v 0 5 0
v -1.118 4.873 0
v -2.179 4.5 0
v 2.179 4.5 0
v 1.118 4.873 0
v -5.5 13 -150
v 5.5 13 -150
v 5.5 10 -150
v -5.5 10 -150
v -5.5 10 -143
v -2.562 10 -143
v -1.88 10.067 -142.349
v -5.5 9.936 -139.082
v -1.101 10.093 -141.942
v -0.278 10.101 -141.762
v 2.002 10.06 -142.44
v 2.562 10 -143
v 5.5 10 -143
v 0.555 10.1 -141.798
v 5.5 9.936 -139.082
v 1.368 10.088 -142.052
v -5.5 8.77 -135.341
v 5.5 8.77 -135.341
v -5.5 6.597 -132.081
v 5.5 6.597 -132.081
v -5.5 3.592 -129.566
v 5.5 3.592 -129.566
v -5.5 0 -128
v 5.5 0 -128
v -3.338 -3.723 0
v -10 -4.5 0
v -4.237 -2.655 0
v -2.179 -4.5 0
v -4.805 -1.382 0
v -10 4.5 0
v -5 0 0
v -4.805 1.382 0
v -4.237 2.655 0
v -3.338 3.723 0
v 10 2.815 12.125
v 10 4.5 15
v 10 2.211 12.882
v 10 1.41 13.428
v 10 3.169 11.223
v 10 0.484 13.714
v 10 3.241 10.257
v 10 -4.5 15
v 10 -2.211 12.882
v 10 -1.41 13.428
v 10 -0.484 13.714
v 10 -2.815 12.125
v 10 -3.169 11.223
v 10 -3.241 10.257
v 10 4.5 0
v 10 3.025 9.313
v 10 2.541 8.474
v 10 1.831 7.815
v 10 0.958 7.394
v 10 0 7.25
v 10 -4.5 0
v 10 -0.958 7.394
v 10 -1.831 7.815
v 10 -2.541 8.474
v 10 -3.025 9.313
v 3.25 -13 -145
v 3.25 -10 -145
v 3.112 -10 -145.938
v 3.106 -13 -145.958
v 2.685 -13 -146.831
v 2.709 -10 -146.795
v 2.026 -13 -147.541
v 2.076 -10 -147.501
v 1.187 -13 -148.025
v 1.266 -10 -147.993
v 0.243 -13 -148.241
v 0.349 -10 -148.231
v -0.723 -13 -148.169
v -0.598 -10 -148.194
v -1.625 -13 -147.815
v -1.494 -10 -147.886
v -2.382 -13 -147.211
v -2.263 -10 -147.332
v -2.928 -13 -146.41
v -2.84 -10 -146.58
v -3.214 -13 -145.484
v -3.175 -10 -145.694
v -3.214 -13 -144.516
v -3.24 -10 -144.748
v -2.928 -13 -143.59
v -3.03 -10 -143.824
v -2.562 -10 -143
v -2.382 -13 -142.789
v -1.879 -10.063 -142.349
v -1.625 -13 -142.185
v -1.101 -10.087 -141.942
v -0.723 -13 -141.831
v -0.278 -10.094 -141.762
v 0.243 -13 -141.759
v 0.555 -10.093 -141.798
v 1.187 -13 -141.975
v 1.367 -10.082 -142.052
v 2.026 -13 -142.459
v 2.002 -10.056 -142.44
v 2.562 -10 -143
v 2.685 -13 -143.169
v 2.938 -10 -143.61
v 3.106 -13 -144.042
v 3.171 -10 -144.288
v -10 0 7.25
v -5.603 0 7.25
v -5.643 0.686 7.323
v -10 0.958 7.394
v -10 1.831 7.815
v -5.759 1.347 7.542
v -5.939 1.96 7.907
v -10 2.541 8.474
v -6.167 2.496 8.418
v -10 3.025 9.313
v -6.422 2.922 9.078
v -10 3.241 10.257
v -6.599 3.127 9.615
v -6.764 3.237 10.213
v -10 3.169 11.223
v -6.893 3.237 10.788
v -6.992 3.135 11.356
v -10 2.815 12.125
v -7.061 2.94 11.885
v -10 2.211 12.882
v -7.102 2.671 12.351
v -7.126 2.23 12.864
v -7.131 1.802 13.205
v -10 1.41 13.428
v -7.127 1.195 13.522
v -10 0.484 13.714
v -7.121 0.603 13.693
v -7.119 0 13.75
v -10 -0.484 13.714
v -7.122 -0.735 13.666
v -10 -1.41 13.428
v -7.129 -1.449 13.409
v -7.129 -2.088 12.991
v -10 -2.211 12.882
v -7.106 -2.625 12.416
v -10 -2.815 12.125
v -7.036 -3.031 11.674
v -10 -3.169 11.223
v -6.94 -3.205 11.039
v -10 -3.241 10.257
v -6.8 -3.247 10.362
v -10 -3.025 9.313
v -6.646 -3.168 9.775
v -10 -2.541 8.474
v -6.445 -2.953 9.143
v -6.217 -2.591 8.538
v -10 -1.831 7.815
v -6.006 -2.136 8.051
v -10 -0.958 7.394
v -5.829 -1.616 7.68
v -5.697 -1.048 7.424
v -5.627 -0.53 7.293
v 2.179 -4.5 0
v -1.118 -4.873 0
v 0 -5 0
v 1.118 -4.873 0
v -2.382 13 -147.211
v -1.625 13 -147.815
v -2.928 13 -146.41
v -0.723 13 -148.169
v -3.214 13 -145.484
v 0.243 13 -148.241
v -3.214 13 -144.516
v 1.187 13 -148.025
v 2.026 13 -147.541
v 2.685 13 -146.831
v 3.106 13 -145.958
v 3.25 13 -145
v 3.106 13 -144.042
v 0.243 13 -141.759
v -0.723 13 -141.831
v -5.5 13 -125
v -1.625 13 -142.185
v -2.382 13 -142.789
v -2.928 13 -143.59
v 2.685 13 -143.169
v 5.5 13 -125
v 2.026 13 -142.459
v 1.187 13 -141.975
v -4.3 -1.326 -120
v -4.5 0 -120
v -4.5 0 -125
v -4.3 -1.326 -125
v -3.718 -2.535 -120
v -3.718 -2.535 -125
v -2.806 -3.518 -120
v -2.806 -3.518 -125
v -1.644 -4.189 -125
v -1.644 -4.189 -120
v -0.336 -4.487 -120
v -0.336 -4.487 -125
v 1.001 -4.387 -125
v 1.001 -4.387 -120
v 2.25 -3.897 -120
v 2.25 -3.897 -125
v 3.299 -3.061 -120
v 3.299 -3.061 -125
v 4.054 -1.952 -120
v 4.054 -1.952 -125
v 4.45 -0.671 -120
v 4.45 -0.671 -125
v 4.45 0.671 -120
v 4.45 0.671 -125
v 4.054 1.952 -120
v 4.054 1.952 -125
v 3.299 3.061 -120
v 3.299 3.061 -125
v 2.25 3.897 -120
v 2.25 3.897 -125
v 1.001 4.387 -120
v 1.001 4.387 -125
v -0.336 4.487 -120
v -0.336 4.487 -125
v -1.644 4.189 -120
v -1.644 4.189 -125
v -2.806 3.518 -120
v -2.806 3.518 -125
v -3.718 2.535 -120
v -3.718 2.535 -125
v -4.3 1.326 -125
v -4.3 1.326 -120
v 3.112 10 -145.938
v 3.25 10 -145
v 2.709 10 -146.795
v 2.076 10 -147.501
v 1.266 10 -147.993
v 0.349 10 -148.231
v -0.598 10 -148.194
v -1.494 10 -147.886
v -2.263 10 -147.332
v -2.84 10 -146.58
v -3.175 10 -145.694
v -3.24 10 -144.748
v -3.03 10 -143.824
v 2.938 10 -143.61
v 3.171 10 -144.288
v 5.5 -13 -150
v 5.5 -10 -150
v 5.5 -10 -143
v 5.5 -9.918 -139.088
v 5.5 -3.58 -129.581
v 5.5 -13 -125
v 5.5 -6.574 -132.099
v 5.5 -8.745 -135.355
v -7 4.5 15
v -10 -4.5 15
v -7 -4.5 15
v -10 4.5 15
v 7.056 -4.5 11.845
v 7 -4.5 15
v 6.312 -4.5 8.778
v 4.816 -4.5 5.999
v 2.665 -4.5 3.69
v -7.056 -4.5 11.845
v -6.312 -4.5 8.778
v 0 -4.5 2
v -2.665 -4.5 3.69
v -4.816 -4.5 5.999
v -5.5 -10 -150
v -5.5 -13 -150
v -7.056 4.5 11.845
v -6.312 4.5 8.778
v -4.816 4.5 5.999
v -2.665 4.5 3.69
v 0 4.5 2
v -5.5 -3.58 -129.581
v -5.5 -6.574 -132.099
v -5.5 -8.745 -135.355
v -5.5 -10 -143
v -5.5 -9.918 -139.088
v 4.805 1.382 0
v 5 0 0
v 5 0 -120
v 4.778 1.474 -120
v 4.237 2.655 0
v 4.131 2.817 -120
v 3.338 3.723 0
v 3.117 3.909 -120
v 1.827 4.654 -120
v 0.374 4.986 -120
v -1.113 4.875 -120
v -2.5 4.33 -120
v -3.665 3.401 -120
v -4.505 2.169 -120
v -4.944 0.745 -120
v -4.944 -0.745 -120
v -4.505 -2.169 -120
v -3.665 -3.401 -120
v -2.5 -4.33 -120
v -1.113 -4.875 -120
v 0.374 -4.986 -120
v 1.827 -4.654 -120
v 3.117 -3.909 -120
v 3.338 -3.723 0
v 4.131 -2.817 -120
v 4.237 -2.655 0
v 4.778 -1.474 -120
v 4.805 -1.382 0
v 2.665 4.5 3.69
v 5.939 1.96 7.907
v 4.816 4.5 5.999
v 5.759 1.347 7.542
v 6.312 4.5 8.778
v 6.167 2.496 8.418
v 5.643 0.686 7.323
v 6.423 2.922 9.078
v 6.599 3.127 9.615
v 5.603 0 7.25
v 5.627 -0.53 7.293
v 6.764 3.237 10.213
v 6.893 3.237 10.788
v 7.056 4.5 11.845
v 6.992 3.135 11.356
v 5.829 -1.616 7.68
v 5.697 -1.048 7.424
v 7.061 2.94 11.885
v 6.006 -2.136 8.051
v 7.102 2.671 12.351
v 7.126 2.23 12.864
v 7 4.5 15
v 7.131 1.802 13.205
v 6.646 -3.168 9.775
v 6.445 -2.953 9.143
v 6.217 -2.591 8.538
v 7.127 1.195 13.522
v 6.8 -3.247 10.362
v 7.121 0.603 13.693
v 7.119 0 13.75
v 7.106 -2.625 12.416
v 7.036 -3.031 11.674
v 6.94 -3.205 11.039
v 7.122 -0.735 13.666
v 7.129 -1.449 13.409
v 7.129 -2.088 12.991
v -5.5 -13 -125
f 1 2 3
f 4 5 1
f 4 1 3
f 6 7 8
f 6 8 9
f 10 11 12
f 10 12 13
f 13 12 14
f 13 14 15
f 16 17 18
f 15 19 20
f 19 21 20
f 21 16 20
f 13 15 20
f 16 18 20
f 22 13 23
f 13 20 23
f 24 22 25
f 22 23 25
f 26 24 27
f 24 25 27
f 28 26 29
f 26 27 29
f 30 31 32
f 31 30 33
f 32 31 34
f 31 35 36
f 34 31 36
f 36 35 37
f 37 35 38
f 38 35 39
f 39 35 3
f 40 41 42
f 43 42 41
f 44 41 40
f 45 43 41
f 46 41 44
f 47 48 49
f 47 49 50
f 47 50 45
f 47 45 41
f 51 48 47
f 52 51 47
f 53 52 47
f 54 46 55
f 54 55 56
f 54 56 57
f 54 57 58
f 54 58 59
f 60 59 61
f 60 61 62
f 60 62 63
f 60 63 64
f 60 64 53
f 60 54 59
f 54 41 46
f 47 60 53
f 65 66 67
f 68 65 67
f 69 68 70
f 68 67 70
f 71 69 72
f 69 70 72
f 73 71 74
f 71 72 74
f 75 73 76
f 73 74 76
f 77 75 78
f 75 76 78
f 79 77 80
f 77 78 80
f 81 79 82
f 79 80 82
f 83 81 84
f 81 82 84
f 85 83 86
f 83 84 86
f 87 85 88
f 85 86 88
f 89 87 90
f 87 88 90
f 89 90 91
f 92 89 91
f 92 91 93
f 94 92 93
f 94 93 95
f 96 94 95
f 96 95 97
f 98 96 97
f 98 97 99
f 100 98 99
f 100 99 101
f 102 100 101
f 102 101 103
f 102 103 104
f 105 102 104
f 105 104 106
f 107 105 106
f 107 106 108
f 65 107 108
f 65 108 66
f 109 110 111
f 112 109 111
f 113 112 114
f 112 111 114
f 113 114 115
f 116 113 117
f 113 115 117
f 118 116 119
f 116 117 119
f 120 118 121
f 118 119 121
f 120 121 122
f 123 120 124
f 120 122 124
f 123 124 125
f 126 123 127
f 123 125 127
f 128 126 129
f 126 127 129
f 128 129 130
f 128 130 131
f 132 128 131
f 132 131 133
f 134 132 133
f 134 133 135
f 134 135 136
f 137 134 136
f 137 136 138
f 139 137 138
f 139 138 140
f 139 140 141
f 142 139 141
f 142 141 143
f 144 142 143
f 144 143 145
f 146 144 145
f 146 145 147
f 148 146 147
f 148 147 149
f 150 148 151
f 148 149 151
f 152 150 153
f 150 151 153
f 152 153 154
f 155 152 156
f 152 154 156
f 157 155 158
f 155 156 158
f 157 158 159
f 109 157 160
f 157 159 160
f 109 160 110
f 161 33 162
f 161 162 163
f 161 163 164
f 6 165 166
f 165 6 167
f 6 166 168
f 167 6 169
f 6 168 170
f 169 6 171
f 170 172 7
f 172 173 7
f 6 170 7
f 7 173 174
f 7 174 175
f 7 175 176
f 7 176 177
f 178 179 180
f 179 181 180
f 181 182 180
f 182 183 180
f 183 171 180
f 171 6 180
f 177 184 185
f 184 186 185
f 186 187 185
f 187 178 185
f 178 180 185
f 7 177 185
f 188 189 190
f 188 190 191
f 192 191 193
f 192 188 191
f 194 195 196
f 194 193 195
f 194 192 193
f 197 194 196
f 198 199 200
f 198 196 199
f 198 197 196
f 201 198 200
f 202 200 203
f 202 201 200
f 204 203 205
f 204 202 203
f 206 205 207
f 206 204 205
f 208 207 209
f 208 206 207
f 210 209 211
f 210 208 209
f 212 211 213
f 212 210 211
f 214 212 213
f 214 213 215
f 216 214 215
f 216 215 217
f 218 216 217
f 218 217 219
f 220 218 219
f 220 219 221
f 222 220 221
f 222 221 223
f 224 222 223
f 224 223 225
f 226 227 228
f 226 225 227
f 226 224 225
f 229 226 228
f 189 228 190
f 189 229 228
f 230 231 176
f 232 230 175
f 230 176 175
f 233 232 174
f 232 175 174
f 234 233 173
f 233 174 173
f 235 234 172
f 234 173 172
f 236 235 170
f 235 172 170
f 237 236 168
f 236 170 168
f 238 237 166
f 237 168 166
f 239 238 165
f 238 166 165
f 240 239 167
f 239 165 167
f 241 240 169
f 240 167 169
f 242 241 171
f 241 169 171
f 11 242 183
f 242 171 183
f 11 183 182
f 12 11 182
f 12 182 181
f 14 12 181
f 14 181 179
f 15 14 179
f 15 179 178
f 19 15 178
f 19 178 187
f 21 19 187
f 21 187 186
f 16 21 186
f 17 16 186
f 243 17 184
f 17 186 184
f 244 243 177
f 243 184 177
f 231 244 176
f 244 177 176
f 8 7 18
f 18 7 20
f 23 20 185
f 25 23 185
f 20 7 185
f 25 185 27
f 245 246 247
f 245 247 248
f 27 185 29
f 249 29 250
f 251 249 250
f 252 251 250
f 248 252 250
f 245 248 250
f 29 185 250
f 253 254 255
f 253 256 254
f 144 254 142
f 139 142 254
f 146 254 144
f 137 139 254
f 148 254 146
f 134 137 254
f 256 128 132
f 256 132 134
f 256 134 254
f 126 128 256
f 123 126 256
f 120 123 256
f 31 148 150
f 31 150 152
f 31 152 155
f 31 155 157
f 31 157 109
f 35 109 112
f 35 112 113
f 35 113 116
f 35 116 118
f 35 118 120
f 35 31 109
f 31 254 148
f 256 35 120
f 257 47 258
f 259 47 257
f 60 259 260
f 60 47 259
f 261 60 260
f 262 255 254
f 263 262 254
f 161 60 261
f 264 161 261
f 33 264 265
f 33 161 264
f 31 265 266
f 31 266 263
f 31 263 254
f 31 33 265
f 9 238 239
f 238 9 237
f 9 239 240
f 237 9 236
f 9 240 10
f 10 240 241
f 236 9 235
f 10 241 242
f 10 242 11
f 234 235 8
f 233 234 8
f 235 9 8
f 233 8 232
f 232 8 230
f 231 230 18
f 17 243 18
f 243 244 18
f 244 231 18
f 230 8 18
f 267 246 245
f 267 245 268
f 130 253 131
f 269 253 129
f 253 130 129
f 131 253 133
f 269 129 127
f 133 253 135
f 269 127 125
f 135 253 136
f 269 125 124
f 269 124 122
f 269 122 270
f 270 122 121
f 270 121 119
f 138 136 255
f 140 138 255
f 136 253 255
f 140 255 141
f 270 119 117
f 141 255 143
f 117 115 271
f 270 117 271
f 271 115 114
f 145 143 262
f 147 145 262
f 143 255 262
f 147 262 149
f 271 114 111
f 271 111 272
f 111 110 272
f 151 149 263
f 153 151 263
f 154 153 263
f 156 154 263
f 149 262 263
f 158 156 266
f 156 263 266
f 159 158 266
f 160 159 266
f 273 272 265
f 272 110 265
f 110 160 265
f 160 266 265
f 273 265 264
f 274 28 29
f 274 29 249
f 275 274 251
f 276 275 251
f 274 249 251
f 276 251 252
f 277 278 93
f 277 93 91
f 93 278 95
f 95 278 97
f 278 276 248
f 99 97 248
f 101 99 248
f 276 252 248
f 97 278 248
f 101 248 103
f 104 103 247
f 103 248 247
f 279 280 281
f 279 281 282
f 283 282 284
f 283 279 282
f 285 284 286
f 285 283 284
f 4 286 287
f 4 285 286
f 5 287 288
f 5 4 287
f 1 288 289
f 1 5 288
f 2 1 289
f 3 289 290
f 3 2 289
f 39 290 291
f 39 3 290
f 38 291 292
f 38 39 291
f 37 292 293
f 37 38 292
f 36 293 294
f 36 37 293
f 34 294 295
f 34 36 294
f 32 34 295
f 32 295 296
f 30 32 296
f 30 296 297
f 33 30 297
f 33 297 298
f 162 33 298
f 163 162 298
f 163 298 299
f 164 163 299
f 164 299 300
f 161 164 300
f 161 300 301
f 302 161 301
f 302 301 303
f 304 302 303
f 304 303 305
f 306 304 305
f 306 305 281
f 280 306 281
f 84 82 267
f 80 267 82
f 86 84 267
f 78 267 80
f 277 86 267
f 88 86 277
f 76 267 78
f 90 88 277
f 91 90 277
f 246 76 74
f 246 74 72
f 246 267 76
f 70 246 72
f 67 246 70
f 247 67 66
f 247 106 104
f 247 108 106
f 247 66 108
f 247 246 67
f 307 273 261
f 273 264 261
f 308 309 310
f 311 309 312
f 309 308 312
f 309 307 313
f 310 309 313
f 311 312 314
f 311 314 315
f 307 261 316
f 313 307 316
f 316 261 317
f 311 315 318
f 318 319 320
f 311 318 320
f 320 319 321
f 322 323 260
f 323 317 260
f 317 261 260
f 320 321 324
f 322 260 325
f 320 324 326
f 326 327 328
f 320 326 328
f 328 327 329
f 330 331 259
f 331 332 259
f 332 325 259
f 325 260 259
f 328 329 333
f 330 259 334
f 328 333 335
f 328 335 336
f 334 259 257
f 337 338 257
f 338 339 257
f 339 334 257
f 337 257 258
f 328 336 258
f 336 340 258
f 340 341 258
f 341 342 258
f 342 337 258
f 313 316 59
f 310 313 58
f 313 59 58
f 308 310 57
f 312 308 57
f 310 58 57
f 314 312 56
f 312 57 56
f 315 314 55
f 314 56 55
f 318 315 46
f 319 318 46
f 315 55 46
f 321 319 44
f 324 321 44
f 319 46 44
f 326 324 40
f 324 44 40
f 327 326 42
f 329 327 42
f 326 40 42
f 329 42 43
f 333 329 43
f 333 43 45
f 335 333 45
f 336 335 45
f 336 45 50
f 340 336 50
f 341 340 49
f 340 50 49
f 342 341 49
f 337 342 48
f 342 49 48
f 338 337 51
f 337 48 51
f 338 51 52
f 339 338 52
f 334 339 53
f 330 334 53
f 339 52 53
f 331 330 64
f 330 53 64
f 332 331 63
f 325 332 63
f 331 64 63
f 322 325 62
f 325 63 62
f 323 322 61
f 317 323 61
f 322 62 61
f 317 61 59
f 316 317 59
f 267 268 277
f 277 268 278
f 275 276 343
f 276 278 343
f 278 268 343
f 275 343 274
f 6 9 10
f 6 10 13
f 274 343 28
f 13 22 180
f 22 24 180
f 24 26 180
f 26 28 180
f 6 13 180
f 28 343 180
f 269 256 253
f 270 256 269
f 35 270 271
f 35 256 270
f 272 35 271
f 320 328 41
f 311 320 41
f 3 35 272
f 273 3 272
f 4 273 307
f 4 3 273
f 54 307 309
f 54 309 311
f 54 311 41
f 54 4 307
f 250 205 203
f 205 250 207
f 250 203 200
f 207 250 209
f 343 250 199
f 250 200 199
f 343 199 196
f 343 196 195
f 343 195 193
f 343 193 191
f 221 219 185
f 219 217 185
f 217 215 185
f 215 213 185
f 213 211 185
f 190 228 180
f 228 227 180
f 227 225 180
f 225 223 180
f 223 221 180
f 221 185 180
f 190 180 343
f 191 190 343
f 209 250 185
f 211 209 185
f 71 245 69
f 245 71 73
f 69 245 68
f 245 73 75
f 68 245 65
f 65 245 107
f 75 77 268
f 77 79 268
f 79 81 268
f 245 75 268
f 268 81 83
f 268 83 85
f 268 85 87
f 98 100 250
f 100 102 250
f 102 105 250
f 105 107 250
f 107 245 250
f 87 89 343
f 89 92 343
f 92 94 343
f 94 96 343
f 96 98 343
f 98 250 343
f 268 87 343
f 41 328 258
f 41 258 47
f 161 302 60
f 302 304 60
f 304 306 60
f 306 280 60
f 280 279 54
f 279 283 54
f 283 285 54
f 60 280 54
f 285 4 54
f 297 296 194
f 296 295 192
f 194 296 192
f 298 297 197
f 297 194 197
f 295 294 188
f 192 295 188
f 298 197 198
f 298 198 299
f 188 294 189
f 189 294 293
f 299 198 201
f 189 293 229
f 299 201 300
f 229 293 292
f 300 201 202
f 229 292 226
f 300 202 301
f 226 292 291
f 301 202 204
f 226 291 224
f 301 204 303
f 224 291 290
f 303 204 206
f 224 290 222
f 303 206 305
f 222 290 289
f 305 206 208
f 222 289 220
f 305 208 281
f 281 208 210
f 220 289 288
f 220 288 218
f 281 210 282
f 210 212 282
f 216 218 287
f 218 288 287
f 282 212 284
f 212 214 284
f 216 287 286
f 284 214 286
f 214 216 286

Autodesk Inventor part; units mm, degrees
ref_plane "YZ Plane" through (0, 0, 0) normal (1, 0, 0) x (0, 1, 0)
ref_plane "XZ Plane" through (0, 0, 0) normal (0, 1, 0) x (-1, 0, 0)
ref_plane "XY Plane" through (0, 0, 0) normal (0, 0, 1) x (1, 0, 0)
sketch "Sketch1" plane through (0, 0, 0) normal (0, 0, 1) x (1, 0, 0)
  circle A0 centre (0, 0) radius 5
  dimension "d0" = 10
extrude "Extrusion1" add sketch "Sketch1" against normal blind 120
sketch "Sketch2" plane through (0, 0, -120) normal (0, 0, -1) x (-1, 0, 0)
  circle A0 centre (0, 0) radius 4.5
  dimension "d3" = 9
extrude "Extrusion2" add sketch "Sketch2" along normal blind 5
sketch "Sketch3" plane through (0, 0, 0) normal (0, 0, 1) x (1, 0, 0)
  circle A0 centre (0, 0) radius 5 projected
  line L0 (0, 0) -> (10, 0)
  line L1 (10, 0) -> (-10, 0)
  line L2 (0, 0) -> (0, 4.5)
  line L3 (0, 4.5) -> (0, -4.5)
  line L4 (0, -4.5) -> (-10, -4.5)
  line L5 (-10, -4.5) -> (-10, 0)
  line L6 (-10, 0) -> (-10, 4.5)
  line L7 (-10, 4.5) -> (0, 4.5)
  line L8 (0, 4.5) -> (10, 4.5)
  line L9 (10, 4.5) -> (10, -4.5)
  line L10 (10, -4.5) -> (0, -4.5)
  dimension "d8" = 4.5
  dimension "d53" = 4.5
  dimension "d56" = 20
  dimension "d57" = 10
  dimension "d58" = 10
extrude "Extrusion3" add sketch "Sketch3" along normal blind 15 contours L0 L2 L8 A0 | L0 L9 L10 A0 | A0 L10 L3 L0 | A0 L8 L9 L0 | L3 L4 A0 L1 | L1 A0 L7 L2 | A0 L1 L6 L7 | L4 L5 L1 A0
sketch "Sketch4" plane through (-10, -4.5, 0) normal (0, -1, 0) x (1, 0, 0)
  line L0 (0, 0) -> (7.8206, 0) projected
  line L1 (12.1794, 0) -> (7.8206, 0) projected
  line L2 (12.1794, 0) -> (20, 0) projected
  line L3 (20, 0) -> (20, 15) projected
  line L4 (0, 15) -> (20, 15) projected
  line L5 (0, 0) -> (0, 15) projected
  line L6 (10, 0) -> (10, 2)
  line L7 (0, 15) -> (20, 15) projected
  line L8 (0, 15) -> (3, 15)
  line L9 (20, 15) -> (17, 15)
  arc A0 (3, 15) -> (10, 2) centre (15.2365, 13.2043) ccw
  line L10 (10, 2) -> (10, 15)
  line L11 (4.3472, 7.3408) -> (0, 7.3408)
  line L12 (0, 0) -> (0, 15) projected
  line L13 (4.3472, 7.3408) -> (4.3472, 0)
  line L14 (15.6528, 7.3408) -> (20, 7.3408)
  line L15 (15.6528, 7.3408) -> (15.6528, 0)
  arc A1 (10, 2) -> (17, 15) centre (4.7635, 13.2043) ccw
  dimension "d12" = 2
  dimension "d13" = 3
  dimension "d14" = 3
extrude "Extrusion4" cut sketch "Sketch4" against normal blind 15 contours A0 L4 L10 | L10 L4 A1
sketch "Sketch5" plane through (10, -4.5, 0) normal (1, 0, 0) x (0, 0, -1)
  line L0 (0, 0) -> (0, 9) projected
  line L1 (0, 9) -> (-15, 9) projected
  line L2 (-15, 0) -> (-15, 9) projected
  line L3 (0, 0) -> (-15, 0) projected
  line L4 (-15, 0) -> (-15, 9) projected
  line L5 (-15, 4.5) -> (-10.5, 4.5)
  line L6 (0, 9) -> (0, 0) projected
  circle A0 centre (-10.5, 4.5) radius 3.25
  point P0 (0, 4.5)
  dimension "d19" = 4.5
  dimension "d55" = 6.5
extrude "Extrusion5" cut sketch "Sketch5" against normal blind 37.25 contours A0
sketch "Sketch6" plane through (0, 0, -125) normal (0, 0, -1) x (-1, 0, 0)
  circle A0 centre (0, 0) radius 4.5 projected
  line L0 (0, 0) -> (0, 13)
  line L1 (0, -4.5) -> (0, 4.5) projected
  line L2 (0, 13) -> (0, -13)
  line L3 (0, -13) -> (-5.5, -13)
  line L4 (-5.5, -13) -> (5.5, -13)
  line L5 (5.5, -13) -> (5.5, 13)
  line L6 (5.5, 13) -> (-5.5, 13)
  line L7 (-5.5, 13) -> (-5.5, -13)
  dimension "d23" = 13
  dimension "d24" = 26
  dimension "d25" = 5.5
  dimension "d26" = 11
extrude "Extrusion6" add sketch "Sketch6" along normal blind 25
sketch "Sketch7" plane through (5.5, -13, -125) normal (1, 0, 0) x (0, 0, -1)
  line L0 (0, 26) -> (0, 0) projected
  line L1 (0, 0) -> (25, 0) projected
  line L2 (25, 26) -> (25, 0) projected
  line L3 (0, 26) -> (25, 26) projected
  line L4 (25, 26) -> (25, 0) projected
  line L5 (25, 26) -> (25, 23)
  line L6 (25, 0) -> (25, 3)
  line L7 (25, 23) -> (18, 23)
  line L8 (0, 8.5) -> (0, 17.5) projected
  line L9 (0, 13) -> (3, 13)
  arc A0 (18, 23) -> (3, 13) centre (16.2622, 9.3566) ccw
  line L10 (25, 3) -> (18, 3)
  line L11 (18, 3) -> (18, 23)
  arc A1 (3, 13) -> (18, 3) centre (16.3321, 16.7481) ccw
  point P0 (-125, 13)
  dimension "d29" = 3
  dimension "d30" = 3
  dimension "d32" = 7
  dimension "d33" = 3
extrude "Extrusion7" cut sketch "Sketch7" against normal blind 25 contours L2 L10 L11 L7 | A0 L11 A1
sketch "Sketch8" plane through (-5.5, 13, -125) normal (0, 1, 0) x (1, 0, 0)
  line L0 (0, 0) -> (11, 0) projected
  line L1 (11, 0) -> (11, 25) projected
  line L2 (0, 25) -> (11, 25) projected
  line L3 (0, 0) -> (0, 25) projected
  line L4 (5.5, 25) -> (5.5, 20)
  circle A0 centre (5.5, 20) radius 3.25
  line L5 (2.25, 20) -> (0, 20)
  line L6 (0, 18) -> (0, 25) projected
  line L7 (8.75, 20) -> (11, 20)
  line L8 (11, 25) -> (11, 18) projected
  point P0 (5.5, -125)
  dimension "d36" = 5
  dimension "d54" = 6.5
extrude "Extrusion8" cut sketch "Sketch8" against normal blind 30 contours A0
